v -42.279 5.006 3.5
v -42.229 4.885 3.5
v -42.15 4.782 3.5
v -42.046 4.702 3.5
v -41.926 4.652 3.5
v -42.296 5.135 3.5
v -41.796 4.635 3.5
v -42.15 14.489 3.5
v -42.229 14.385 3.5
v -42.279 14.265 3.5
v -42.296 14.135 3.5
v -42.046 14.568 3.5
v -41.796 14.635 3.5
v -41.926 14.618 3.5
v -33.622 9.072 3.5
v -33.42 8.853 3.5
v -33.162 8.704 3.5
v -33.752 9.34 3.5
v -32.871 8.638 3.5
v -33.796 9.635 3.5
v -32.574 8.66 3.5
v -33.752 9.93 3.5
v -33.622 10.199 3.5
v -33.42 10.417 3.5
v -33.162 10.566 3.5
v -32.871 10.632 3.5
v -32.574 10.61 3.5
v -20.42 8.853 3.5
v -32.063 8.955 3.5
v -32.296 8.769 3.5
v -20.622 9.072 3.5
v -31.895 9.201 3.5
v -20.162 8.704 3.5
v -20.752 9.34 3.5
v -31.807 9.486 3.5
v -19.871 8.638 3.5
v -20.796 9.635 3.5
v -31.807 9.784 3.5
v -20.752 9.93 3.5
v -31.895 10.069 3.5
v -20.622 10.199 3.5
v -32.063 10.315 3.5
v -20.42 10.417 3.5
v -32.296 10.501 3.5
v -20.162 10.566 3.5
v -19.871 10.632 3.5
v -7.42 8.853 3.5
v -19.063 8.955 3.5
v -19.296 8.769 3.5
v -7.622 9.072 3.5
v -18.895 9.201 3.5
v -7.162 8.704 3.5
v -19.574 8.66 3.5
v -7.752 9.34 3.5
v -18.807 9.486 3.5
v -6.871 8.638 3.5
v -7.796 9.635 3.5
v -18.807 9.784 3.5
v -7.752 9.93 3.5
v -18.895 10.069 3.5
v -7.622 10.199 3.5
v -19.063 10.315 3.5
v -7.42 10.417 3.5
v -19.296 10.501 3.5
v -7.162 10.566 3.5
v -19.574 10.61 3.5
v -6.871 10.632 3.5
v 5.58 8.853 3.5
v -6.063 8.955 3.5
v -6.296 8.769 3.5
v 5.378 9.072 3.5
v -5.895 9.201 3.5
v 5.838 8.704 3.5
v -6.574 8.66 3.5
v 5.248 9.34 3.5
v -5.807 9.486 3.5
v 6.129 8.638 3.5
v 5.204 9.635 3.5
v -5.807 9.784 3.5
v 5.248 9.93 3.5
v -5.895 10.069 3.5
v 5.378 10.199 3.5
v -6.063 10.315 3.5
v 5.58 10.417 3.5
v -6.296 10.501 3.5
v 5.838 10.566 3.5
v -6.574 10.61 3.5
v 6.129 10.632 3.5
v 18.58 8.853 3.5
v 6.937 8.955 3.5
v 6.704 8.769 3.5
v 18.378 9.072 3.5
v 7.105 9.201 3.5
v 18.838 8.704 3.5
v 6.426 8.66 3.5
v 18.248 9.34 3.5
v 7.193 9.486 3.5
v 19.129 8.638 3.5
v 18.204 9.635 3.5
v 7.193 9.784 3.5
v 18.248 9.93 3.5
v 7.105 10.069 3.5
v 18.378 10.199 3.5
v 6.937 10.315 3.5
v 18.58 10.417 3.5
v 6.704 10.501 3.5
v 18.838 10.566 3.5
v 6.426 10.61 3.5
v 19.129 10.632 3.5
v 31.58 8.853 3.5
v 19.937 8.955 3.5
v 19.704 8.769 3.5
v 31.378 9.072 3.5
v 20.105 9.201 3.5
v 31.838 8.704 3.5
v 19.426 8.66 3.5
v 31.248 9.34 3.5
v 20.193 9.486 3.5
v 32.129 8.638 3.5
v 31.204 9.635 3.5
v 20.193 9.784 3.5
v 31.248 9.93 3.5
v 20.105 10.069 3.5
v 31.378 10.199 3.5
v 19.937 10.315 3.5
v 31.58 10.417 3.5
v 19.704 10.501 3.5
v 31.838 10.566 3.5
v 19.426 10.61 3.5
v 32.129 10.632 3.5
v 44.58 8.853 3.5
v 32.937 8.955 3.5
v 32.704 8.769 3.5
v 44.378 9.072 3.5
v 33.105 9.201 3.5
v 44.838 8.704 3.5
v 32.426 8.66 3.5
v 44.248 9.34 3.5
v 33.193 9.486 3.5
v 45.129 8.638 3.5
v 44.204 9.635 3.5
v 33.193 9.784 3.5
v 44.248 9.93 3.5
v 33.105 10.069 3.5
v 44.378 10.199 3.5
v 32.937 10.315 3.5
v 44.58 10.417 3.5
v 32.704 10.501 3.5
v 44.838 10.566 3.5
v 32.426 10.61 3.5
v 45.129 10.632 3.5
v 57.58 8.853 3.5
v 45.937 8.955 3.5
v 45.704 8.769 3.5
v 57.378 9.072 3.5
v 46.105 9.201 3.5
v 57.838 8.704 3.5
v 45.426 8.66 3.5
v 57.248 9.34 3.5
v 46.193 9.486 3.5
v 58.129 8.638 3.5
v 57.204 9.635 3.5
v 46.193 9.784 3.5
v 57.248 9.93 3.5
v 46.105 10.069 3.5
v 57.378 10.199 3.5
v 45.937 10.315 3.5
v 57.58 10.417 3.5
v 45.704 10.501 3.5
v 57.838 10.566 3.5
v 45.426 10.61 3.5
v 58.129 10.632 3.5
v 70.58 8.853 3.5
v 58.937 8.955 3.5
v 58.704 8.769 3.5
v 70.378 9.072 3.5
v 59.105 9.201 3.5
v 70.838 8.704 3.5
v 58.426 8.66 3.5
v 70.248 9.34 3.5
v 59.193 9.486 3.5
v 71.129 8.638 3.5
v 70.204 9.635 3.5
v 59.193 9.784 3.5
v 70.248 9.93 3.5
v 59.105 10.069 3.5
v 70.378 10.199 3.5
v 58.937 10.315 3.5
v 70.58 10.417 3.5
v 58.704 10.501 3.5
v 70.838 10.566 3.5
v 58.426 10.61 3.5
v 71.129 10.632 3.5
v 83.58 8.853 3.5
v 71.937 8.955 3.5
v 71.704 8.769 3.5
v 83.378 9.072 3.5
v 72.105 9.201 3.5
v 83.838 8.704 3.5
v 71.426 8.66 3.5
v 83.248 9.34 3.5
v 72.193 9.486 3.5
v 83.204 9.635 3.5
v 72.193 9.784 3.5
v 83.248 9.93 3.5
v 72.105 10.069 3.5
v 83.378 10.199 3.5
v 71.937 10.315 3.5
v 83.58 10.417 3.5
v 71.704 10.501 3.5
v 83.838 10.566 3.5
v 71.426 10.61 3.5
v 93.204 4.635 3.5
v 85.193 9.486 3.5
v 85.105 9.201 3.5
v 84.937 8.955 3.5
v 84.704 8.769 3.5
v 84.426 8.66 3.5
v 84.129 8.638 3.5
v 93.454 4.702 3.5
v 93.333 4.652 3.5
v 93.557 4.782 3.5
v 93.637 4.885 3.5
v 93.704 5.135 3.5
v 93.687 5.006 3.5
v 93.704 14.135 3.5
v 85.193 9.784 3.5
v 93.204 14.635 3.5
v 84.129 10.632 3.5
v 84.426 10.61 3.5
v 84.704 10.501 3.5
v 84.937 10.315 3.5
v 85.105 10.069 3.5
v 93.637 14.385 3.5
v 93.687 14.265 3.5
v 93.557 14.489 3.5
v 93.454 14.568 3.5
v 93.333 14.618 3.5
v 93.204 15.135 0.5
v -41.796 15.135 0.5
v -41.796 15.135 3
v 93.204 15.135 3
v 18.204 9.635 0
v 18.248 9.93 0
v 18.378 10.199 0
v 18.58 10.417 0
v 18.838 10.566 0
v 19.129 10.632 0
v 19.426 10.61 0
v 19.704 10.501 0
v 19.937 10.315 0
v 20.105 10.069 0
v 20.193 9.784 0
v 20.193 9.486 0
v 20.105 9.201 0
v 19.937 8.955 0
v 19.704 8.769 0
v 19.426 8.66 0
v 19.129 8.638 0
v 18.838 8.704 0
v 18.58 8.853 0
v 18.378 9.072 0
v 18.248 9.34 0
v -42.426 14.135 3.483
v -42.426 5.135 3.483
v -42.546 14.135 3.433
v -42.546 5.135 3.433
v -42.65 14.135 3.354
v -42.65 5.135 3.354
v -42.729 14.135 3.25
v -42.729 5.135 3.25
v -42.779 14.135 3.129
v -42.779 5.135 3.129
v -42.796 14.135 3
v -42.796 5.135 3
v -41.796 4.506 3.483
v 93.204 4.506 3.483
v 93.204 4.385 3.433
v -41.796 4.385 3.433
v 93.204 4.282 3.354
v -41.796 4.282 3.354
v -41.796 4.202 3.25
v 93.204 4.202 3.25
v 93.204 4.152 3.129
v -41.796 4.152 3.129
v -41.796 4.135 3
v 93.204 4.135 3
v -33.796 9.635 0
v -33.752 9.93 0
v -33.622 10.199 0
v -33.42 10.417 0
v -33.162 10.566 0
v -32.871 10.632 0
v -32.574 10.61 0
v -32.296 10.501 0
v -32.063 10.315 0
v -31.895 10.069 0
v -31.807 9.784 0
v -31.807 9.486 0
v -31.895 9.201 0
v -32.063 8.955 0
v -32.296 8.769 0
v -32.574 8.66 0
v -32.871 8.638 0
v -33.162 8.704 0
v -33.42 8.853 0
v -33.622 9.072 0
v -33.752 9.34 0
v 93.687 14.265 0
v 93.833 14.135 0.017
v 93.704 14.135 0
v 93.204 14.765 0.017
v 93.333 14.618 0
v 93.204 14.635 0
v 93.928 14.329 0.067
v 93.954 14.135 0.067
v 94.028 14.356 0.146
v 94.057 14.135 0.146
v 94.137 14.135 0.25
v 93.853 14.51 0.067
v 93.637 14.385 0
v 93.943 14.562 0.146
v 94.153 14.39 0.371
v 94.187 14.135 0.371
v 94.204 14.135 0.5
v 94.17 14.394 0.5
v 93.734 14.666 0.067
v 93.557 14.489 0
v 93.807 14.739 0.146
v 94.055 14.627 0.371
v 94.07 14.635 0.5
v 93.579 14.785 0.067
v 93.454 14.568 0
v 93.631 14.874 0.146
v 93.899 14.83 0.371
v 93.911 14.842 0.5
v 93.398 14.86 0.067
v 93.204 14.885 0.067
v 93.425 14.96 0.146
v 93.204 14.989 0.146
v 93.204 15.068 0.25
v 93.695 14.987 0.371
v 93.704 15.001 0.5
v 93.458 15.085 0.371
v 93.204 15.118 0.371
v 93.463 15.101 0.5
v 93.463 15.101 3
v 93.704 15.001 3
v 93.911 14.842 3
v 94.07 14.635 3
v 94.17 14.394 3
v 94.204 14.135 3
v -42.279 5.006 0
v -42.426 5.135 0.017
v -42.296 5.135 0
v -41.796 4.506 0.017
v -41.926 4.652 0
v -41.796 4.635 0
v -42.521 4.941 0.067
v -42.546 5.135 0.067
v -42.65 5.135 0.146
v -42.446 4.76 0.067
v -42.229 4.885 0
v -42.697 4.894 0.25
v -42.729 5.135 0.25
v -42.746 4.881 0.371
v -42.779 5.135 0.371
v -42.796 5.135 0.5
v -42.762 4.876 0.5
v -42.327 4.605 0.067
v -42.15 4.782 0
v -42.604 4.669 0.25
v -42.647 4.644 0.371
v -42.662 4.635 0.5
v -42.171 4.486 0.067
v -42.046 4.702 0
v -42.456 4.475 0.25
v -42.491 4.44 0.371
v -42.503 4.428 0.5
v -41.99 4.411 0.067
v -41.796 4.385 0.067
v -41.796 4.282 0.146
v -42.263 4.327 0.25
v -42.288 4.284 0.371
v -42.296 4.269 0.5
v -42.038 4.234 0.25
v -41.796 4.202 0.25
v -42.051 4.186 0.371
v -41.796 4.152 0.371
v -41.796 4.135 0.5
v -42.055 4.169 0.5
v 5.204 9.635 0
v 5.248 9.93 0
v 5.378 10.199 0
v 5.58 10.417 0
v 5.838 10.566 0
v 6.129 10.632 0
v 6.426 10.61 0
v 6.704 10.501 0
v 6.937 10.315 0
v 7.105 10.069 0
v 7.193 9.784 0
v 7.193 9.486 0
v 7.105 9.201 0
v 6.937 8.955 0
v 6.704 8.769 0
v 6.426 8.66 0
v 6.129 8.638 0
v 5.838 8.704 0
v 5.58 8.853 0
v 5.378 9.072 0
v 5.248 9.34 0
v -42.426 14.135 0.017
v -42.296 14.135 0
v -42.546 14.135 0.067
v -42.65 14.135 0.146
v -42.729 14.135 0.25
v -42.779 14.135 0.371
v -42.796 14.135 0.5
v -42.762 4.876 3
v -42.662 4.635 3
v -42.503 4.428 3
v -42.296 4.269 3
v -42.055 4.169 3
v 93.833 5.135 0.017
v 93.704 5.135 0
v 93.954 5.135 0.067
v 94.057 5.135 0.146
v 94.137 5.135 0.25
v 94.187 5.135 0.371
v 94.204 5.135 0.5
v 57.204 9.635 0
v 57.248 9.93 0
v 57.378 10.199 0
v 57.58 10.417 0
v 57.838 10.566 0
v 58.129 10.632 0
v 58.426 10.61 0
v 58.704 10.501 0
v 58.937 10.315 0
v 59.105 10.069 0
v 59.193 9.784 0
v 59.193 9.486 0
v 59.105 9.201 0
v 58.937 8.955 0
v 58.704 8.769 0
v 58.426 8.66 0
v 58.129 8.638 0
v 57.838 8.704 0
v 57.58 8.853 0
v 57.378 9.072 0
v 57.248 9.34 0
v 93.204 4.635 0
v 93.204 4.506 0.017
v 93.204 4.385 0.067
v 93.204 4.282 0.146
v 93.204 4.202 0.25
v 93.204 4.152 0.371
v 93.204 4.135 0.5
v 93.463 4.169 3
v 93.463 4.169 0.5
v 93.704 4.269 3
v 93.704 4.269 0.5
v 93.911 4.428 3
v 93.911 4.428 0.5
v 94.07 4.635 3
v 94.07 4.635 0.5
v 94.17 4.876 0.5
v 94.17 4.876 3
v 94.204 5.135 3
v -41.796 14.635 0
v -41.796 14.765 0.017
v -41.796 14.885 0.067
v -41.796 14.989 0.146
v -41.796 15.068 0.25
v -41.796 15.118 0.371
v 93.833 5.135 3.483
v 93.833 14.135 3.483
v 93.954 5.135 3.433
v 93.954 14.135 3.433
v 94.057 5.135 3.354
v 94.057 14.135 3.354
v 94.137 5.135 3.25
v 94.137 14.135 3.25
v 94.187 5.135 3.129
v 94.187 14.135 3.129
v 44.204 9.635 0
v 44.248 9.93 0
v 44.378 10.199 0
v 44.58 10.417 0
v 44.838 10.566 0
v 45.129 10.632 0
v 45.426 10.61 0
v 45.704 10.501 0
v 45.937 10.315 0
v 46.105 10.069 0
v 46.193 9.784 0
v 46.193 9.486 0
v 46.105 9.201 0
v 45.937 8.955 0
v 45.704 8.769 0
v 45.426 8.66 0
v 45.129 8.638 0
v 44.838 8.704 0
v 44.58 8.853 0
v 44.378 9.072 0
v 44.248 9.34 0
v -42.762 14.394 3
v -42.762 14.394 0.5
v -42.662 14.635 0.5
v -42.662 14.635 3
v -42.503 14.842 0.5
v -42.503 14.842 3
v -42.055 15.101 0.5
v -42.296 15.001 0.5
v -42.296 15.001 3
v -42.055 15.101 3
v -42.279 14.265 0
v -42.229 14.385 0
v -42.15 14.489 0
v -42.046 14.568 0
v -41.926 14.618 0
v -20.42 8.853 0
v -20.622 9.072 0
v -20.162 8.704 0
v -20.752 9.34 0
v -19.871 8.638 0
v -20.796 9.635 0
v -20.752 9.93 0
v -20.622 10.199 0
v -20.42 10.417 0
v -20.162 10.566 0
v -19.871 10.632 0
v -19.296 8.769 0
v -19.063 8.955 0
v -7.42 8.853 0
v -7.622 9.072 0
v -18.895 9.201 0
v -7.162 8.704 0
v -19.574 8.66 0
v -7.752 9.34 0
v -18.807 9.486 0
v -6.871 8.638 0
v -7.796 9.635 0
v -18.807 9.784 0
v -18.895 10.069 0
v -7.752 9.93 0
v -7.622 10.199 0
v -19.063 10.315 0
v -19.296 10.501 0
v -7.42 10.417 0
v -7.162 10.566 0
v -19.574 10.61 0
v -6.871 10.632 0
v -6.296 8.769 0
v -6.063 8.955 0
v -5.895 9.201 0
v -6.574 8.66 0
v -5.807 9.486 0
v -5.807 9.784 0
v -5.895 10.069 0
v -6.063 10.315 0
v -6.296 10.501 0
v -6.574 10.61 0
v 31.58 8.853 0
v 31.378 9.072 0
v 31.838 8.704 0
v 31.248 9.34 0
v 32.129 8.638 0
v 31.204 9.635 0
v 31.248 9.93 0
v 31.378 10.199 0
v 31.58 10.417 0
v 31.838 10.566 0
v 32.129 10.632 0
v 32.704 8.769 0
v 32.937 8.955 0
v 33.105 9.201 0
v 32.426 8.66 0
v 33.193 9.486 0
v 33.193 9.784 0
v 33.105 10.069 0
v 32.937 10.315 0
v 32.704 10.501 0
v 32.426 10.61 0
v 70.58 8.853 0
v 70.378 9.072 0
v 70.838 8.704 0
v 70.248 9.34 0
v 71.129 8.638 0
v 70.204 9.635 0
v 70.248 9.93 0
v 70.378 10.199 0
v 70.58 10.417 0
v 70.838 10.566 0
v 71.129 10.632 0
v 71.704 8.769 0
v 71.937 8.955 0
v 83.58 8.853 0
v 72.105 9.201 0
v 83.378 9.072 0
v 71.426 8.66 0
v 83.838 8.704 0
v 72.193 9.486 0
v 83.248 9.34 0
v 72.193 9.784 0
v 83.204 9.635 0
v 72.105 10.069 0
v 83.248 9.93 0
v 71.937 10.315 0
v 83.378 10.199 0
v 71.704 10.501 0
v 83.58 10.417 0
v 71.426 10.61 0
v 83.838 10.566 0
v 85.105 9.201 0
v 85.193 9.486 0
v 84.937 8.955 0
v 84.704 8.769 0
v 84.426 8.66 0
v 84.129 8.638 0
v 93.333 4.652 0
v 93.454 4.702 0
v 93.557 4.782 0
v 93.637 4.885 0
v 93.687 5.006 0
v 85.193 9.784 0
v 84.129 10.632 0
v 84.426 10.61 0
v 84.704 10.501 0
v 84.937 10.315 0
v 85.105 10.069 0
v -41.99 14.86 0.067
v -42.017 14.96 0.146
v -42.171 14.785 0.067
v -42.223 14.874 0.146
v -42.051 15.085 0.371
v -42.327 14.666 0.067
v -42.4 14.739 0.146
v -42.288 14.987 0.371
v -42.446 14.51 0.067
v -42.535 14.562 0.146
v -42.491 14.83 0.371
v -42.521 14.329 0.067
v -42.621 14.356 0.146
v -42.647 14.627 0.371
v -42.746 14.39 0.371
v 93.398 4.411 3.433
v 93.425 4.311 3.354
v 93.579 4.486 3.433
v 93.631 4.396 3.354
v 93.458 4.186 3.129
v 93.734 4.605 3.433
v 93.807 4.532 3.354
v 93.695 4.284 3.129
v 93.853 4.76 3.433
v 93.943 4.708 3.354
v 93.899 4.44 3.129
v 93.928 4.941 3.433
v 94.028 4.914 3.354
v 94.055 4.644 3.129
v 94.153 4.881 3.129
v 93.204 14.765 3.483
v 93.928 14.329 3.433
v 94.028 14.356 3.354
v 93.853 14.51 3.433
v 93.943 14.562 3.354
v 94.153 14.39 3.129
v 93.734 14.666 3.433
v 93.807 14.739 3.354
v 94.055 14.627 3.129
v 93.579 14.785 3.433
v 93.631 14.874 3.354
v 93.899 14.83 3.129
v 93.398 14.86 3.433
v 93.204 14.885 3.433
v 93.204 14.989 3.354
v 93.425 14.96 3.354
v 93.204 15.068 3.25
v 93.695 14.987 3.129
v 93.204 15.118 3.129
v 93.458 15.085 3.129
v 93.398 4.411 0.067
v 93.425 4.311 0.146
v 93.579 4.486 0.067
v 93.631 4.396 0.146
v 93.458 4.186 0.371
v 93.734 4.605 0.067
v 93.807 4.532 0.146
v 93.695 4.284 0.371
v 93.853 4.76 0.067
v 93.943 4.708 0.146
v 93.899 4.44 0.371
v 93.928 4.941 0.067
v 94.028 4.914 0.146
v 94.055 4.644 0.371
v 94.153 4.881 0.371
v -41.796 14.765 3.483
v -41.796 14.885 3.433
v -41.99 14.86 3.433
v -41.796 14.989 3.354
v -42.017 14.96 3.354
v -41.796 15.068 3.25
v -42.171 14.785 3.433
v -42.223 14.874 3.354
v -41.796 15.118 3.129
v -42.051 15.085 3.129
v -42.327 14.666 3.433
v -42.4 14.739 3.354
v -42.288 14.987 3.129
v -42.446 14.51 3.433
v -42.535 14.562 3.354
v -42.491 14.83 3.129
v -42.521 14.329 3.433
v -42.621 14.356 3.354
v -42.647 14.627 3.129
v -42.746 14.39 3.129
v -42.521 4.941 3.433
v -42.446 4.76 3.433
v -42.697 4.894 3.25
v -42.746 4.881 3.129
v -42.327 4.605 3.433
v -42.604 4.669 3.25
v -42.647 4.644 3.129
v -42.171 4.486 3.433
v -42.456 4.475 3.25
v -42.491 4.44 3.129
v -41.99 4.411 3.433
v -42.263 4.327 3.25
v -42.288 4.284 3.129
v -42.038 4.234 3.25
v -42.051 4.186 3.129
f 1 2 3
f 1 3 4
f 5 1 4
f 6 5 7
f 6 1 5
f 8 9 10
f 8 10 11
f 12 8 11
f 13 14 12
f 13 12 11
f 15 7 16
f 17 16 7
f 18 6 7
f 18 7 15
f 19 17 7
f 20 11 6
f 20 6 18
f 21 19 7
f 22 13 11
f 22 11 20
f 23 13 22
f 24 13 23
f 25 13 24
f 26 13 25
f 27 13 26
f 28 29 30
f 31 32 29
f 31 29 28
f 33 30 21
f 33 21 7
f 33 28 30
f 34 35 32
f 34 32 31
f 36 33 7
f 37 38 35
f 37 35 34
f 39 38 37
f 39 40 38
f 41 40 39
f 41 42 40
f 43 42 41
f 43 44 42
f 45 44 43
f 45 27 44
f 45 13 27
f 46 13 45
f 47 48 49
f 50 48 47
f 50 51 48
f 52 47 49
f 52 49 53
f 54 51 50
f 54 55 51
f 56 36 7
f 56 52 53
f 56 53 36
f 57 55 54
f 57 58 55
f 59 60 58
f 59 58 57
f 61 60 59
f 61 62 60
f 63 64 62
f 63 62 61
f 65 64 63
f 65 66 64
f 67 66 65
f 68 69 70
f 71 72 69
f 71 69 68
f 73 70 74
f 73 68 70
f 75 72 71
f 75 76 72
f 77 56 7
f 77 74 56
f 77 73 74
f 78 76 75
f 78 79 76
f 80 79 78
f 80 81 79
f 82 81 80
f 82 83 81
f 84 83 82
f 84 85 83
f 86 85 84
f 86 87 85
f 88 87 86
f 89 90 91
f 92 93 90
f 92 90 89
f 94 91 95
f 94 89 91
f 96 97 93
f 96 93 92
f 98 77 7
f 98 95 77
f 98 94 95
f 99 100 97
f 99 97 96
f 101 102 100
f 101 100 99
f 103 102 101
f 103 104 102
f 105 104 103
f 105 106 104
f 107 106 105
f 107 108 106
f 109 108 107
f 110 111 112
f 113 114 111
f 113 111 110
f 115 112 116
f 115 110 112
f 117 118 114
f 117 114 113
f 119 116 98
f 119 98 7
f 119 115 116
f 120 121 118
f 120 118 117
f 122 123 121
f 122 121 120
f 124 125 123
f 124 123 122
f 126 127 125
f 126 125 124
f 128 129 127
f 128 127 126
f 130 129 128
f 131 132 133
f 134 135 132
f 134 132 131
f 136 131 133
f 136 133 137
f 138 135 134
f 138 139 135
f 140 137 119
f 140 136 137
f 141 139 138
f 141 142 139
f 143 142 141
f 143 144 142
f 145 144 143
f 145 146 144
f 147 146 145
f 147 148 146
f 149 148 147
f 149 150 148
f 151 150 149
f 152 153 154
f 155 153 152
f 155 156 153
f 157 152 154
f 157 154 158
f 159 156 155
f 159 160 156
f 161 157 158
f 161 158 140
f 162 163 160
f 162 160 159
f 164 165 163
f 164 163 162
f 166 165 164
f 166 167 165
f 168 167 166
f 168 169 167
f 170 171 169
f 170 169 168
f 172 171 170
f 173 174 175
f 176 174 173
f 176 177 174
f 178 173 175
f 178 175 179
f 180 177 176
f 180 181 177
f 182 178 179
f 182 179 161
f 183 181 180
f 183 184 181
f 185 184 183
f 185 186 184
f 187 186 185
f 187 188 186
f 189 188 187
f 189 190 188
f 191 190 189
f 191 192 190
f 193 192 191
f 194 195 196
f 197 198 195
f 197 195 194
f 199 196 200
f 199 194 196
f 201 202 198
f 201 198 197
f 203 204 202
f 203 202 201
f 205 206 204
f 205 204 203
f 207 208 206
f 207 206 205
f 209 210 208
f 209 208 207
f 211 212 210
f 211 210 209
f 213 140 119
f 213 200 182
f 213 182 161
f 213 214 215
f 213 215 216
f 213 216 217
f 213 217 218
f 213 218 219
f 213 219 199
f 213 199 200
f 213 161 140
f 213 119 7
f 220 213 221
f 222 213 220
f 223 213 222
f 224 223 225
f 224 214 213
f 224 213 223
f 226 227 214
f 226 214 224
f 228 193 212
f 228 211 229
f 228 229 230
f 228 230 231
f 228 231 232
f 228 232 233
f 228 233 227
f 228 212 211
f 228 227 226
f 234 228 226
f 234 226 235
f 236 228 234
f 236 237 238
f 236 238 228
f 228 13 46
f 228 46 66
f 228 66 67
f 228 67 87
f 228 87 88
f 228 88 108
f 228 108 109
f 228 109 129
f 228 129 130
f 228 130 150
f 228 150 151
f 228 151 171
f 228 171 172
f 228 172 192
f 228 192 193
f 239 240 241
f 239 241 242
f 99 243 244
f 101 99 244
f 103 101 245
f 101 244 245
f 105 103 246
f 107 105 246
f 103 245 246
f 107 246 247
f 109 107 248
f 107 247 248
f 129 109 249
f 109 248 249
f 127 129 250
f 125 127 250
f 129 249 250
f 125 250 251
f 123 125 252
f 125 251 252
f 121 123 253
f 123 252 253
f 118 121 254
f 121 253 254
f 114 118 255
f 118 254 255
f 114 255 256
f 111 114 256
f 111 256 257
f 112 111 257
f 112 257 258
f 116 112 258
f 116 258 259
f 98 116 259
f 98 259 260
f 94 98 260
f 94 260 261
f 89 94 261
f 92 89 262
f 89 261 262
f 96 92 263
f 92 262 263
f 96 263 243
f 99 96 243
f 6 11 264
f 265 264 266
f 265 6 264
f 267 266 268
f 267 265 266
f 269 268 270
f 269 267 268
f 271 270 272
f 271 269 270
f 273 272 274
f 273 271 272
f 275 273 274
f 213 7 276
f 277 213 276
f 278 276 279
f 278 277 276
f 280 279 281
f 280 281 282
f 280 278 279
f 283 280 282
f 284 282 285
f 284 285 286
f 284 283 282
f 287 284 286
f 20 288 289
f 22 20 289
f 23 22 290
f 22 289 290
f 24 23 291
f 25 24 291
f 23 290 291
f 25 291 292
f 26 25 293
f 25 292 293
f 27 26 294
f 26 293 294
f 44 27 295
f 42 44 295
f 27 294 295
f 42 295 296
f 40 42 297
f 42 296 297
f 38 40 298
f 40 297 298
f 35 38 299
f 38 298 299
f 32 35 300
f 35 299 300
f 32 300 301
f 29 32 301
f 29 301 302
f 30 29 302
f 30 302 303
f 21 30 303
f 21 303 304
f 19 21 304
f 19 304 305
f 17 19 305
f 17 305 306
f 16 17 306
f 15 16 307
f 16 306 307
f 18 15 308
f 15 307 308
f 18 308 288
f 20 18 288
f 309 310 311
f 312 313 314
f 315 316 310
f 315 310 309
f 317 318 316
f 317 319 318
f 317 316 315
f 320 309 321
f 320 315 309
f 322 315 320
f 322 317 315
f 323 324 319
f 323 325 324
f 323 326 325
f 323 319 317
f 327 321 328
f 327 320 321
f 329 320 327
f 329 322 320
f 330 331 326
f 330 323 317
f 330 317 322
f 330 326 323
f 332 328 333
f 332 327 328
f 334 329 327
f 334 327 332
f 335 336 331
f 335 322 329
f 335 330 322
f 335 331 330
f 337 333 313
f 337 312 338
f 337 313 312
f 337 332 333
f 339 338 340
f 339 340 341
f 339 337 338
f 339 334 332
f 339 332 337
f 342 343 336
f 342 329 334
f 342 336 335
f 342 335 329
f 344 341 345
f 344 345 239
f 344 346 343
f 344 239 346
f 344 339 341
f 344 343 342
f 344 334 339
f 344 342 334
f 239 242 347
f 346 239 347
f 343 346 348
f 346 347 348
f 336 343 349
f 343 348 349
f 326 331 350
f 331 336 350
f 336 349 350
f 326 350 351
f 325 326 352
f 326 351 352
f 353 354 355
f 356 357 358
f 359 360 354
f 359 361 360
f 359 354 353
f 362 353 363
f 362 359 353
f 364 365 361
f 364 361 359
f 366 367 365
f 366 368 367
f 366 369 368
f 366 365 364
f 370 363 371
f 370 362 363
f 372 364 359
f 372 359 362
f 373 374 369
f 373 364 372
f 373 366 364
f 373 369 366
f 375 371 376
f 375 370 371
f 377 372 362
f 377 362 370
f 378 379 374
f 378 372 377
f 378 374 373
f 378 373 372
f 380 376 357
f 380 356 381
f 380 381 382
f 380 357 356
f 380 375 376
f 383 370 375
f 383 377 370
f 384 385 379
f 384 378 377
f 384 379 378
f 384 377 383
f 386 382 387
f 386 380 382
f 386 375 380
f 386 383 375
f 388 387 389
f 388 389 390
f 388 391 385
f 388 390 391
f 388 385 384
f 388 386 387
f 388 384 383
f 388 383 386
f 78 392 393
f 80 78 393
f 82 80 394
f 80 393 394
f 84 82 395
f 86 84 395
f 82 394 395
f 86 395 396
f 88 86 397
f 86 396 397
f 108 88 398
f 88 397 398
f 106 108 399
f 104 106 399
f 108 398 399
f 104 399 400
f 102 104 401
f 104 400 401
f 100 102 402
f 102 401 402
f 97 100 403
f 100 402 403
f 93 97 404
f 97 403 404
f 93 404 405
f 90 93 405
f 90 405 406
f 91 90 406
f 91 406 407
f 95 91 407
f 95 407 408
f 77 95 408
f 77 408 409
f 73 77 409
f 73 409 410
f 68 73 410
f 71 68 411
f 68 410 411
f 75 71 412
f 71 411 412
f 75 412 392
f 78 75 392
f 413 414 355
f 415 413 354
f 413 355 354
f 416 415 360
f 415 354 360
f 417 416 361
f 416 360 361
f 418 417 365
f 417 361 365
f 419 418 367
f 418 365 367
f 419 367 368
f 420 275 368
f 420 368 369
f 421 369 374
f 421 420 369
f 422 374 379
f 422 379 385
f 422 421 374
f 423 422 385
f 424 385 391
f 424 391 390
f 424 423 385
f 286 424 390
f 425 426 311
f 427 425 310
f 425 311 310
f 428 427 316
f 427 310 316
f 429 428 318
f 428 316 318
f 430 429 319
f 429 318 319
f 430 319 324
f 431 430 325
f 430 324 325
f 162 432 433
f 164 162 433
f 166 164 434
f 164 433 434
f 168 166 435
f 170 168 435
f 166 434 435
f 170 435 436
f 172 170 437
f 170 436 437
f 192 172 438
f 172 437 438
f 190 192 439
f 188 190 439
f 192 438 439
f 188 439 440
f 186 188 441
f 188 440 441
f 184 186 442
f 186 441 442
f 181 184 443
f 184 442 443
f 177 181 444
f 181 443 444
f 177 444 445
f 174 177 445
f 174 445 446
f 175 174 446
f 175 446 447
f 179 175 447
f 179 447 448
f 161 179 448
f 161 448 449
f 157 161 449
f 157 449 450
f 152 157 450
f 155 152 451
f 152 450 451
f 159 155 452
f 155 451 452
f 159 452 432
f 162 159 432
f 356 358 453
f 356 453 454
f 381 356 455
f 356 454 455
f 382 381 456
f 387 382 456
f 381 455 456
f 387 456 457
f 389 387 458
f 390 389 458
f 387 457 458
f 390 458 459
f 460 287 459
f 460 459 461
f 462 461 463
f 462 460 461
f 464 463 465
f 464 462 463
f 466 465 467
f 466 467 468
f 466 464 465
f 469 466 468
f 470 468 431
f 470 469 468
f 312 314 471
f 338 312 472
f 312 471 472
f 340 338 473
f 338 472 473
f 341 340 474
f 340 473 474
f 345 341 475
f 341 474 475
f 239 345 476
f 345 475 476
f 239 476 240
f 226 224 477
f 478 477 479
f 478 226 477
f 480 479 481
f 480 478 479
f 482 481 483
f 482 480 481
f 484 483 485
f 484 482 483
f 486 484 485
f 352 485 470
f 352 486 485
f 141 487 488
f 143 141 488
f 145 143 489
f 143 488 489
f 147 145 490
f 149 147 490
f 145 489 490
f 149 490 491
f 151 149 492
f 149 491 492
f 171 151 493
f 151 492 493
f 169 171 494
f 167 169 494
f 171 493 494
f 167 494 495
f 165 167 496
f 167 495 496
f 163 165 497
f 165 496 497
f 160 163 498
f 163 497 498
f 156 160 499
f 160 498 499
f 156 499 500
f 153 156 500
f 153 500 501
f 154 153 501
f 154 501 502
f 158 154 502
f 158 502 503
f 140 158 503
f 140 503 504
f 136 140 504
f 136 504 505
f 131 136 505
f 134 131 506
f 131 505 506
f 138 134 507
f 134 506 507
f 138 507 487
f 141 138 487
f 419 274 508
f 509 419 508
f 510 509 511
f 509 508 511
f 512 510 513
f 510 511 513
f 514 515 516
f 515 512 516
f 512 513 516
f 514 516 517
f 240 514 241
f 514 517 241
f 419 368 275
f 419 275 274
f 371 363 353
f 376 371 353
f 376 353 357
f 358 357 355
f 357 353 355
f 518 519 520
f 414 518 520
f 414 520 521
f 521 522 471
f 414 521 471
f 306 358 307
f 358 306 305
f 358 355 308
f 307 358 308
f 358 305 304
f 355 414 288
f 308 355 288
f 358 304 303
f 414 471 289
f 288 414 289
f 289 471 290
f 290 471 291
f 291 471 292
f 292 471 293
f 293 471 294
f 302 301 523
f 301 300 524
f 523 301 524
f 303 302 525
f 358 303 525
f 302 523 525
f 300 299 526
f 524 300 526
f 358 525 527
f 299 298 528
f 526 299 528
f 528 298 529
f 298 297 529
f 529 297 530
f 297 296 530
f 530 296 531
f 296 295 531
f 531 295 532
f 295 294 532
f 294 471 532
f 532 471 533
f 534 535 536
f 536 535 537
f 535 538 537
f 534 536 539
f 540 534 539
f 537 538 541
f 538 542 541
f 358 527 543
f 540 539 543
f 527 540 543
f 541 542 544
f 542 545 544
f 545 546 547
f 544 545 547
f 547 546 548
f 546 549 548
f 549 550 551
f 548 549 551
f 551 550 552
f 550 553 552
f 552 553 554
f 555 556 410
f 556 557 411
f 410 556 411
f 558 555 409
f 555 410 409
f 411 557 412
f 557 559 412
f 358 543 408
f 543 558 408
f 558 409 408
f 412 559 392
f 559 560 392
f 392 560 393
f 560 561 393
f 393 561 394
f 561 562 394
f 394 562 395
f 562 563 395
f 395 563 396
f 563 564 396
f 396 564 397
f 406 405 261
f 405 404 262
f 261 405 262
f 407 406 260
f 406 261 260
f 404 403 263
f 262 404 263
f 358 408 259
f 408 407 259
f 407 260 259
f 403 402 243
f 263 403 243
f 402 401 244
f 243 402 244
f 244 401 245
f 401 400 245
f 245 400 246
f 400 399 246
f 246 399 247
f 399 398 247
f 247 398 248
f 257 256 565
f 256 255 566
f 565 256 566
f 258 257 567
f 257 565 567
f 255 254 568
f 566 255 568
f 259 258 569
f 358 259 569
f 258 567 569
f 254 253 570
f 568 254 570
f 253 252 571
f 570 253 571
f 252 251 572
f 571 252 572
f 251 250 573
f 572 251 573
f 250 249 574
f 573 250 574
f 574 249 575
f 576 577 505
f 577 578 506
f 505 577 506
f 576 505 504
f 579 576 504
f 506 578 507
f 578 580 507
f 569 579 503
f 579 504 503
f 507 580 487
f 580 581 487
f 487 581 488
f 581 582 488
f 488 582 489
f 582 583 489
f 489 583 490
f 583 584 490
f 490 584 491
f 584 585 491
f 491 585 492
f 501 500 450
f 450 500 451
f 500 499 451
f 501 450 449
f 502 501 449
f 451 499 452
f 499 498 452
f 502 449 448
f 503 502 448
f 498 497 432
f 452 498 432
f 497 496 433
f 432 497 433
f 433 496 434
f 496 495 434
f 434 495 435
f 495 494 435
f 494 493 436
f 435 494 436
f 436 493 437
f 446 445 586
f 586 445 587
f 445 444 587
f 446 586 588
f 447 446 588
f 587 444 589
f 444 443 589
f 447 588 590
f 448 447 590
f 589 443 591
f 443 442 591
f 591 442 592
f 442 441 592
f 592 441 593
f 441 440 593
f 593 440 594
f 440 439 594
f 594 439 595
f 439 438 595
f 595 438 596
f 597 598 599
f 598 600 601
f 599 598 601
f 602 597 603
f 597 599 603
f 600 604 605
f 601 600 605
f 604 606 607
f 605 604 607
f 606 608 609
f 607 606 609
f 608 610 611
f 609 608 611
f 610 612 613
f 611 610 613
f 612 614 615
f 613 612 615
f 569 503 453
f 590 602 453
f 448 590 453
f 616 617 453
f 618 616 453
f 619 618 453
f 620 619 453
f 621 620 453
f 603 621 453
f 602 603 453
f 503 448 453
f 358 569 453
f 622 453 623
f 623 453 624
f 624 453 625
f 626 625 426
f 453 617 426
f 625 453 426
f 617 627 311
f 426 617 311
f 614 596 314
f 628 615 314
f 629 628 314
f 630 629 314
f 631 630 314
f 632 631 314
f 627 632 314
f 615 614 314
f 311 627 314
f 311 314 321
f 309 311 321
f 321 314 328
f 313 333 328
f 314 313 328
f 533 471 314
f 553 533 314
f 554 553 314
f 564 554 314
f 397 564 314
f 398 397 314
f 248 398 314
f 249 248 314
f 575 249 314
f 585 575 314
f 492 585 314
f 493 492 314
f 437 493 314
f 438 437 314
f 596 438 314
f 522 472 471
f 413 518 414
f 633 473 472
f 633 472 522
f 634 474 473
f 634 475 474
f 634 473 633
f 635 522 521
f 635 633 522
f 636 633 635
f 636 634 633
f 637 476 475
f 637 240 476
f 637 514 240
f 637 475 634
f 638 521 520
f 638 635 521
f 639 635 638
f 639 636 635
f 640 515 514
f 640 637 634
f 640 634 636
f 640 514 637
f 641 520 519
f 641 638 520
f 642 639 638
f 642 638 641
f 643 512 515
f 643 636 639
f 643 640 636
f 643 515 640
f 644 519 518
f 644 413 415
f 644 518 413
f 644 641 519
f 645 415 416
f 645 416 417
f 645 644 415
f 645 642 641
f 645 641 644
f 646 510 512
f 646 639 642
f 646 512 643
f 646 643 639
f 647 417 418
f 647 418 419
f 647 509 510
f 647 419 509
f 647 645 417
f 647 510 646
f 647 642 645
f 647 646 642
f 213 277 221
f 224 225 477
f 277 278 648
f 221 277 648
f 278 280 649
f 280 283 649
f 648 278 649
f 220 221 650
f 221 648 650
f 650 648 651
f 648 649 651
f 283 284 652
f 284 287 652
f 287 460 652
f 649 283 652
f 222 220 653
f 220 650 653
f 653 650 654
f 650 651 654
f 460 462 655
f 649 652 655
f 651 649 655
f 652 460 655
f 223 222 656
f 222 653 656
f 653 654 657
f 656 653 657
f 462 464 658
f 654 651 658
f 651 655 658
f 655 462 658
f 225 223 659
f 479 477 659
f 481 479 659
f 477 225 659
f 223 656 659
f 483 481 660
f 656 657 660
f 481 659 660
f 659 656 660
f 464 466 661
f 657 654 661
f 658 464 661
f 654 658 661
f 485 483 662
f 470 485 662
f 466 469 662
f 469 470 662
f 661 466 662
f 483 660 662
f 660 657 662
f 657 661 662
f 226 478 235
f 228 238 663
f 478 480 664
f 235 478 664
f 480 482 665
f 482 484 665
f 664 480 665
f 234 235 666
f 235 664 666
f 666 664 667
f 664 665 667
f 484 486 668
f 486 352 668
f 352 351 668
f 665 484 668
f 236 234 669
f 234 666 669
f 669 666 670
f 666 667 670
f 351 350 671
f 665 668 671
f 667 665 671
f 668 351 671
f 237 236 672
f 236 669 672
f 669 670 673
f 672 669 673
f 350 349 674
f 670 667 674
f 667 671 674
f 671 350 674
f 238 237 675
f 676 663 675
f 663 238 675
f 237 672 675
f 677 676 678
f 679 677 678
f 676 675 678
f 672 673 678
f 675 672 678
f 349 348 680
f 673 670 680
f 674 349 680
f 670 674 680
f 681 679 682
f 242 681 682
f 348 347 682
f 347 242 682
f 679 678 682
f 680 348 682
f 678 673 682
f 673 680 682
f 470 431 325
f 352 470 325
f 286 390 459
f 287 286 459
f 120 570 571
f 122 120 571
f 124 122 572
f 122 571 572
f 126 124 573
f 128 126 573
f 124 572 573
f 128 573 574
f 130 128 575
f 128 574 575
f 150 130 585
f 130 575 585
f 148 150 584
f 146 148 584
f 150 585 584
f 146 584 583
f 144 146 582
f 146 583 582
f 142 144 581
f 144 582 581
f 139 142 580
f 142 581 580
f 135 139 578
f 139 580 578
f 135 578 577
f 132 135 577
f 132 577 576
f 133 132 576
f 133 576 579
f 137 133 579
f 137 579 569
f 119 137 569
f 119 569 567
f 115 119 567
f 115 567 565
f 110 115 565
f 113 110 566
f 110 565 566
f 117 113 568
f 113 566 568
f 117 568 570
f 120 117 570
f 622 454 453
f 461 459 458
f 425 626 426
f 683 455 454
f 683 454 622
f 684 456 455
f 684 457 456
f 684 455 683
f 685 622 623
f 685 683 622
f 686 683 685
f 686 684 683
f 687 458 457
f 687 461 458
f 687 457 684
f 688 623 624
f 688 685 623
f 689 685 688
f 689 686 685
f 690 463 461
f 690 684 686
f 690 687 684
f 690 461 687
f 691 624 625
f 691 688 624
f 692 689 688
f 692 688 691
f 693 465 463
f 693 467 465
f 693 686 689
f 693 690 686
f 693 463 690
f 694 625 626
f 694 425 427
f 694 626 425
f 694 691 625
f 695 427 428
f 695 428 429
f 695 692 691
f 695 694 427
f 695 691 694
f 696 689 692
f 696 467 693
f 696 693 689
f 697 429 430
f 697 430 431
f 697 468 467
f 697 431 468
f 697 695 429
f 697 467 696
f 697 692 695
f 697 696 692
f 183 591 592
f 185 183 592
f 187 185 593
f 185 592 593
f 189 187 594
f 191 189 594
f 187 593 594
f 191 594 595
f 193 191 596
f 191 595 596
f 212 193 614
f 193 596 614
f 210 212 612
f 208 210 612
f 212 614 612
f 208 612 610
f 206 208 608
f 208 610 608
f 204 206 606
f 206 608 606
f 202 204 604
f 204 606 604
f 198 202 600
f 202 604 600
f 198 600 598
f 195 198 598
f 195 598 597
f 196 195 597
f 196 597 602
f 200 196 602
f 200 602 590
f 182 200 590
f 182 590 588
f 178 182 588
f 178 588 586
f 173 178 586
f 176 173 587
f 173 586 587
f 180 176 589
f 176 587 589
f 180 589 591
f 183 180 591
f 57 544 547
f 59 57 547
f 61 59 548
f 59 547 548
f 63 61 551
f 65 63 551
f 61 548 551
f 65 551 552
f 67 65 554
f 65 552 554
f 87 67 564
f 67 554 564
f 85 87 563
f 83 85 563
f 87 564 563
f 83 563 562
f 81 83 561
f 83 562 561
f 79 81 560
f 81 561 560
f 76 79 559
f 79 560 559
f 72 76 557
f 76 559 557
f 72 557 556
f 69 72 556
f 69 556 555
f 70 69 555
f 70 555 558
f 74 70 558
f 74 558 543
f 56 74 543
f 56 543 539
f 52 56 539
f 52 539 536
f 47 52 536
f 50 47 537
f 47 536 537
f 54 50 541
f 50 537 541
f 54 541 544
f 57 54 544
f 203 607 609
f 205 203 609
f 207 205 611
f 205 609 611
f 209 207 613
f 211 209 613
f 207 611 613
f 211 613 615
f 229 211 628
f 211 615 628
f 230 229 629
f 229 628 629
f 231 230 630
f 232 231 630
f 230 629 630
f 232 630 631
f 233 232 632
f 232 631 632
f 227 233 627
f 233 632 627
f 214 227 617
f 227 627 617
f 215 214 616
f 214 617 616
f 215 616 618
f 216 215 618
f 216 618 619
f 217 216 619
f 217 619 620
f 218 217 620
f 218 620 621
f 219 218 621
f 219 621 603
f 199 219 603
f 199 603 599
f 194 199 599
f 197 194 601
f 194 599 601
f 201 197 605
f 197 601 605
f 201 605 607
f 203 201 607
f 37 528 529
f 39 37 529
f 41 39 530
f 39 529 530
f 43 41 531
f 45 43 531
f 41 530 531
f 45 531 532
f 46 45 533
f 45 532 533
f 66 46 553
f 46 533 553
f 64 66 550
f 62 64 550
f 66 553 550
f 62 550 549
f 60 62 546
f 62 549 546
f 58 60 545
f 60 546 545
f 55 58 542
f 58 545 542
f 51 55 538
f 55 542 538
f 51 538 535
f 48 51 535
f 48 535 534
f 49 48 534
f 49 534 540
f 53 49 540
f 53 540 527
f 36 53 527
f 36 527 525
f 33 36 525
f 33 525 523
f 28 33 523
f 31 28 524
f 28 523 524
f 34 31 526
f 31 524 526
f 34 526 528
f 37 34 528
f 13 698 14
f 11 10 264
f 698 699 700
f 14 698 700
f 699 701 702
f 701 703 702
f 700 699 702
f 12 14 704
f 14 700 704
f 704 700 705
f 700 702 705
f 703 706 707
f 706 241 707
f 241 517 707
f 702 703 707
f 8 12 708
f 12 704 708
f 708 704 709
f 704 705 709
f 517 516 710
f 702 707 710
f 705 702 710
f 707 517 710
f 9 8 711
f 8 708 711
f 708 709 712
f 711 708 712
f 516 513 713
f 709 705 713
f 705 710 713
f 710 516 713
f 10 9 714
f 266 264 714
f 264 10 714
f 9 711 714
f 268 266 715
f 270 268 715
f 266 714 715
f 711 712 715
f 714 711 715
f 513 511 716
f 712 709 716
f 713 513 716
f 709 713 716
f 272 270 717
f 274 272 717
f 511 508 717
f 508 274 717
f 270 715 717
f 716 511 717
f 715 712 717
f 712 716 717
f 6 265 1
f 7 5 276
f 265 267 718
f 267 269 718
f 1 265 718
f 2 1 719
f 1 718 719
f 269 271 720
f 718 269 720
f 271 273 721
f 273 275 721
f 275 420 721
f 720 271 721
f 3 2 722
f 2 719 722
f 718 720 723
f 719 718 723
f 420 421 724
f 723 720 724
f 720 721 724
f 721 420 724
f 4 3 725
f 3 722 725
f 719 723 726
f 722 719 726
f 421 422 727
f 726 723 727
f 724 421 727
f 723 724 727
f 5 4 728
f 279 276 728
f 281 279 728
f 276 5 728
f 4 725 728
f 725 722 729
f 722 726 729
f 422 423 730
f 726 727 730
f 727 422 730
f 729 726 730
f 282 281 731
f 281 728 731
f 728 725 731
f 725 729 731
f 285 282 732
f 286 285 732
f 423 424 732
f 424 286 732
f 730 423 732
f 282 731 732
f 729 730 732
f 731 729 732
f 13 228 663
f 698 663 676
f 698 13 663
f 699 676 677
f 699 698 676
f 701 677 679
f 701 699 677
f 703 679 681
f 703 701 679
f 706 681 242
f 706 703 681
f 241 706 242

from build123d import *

# Parameters (mm, degrees)
SKETCH1_W           = 137
SKETCH1_H           = 11
BOSS_EXTRUDE1_DEPTH = 3.5
SKETCH2_R           = 1
CUT_EXTRUDE1_DEPTH  = 3.5
FILLET1_R           = 1
FILLET2_R           = 0.5


with BuildPart() as part:
    # Sketch1 → Boss-Extrude1 (new body)
    with BuildSketch(Plane.XY):
        with Locations((25.703809524, 9.635238095)):
            Rectangle(SKETCH1_W, SKETCH1_H)
    extrude(amount=BOSS_EXTRUDE1_DEPTH)

    # Sketch2 → Cut-Extrude1 (cut)
    with BuildSketch(Plane(origin=(0, 0, 0), x_dir=(-1, 0, 0), z_dir=(0, 0, -1))):
        with Locations((-84.203809524, 9.635238095)):
            Circle(SKETCH2_R)
        with Locations((-71.203809524, 9.635238095)):
            Circle(SKETCH2_R)
        with Locations((-58.203809524, 9.635238095)):
            Circle(SKETCH2_R)
        with Locations((-45.203809524, 9.635238095)):
            Circle(SKETCH2_R)
        with Locations((-32.203809524, 9.635238095)):
            Circle(SKETCH2_R)
        with Locations((-19.203809524, 9.635238095)):
            Circle(SKETCH2_R)
        with Locations((-6.203809524, 9.635238095)):
            Circle(SKETCH2_R)
        with Locations((6.796190476, 9.635238095)):
            Circle(SKETCH2_R)
        with Locations((19.796190476, 9.635238095)):
            Circle(SKETCH2_R)
        with Locations((32.796190476, 9.635238095)):
            Circle(SKETCH2_R)
    extrude(amount=-CUT_EXTRUDE1_DEPTH, mode=Mode.SUBTRACT)

    # Fillet1
    fillet1_edges = [part.edges().sort_by_distance(p)[0] for p in [
        (-42.796190476, 15.135238095, 1.75),
        (94.203809524, 15.135238095, 1.75),
        (94.203809524, 4.135238095, 1.75),
        (-42.796190476, 4.135238095, 1.75),
    ]]
    fillet(fillet1_edges, radius=FILLET1_R)

    # Fillet2
    fillet2_edges = [part.edges().sort_by_distance(p)[0] for p in [
        (25.703809524, 4.135238095, 0),
        (25.703809524, 4.135238095, 3.5),
        (-42.796190476, 9.635238095, 0),
        (25.703809524, 15.135238095, 0),
        (94.203809524, 9.635238095, 0),
        (93.910916305, 14.842344876, 0),
        (93.910916305, 4.428131314, 0),
        (-42.503297257, 14.842344876, 0),
        (-42.503297257, 4.428131314, 0),
        (-42.796190476, 9.635238095, 3.5),
        (94.203809524, 9.635238095, 3.5),
        (25.703809524, 15.135238095, 3.5),
        (93.910916305, 14.842344876, 3.5),
        (93.910916305, 4.428131314, 3.5),
        (-42.503297257, 14.842344876, 3.5),
        (-42.503297257, 4.428131314, 3.5),
    ]]
    fillet(fillet2_edges, radius=FILLET2_R)


solid = part.part
